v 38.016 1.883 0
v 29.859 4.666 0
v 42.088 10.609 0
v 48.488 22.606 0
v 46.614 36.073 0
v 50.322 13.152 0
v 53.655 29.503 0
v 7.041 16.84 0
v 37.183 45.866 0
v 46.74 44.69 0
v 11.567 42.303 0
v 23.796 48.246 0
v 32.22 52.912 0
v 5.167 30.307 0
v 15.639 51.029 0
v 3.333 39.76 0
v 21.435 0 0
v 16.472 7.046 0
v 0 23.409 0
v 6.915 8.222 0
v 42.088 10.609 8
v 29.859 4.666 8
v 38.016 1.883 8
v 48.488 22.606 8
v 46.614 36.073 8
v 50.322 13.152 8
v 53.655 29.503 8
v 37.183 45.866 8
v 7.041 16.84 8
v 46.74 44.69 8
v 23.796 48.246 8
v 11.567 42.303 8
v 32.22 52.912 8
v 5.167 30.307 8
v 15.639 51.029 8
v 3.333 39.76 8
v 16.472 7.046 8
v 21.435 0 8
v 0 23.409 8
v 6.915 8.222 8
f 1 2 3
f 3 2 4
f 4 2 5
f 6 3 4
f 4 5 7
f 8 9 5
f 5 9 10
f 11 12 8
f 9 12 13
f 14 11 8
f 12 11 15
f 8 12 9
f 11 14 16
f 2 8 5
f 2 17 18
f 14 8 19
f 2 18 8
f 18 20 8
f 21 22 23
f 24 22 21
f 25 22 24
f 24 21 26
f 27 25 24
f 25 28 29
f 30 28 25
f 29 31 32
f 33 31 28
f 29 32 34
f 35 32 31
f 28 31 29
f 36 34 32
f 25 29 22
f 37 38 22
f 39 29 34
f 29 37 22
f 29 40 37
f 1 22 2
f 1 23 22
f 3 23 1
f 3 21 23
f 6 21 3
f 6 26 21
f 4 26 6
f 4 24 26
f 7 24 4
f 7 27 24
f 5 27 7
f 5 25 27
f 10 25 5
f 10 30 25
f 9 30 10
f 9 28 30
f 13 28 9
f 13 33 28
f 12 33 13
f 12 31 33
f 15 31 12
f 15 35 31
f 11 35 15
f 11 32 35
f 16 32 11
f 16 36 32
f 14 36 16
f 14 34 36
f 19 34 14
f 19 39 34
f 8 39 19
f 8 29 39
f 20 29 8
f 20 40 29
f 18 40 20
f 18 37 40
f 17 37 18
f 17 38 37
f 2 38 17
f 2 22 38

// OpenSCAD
$fn = 32;

// ----------------------------------------------------------------------
// Chain sprocket: 10 teeth, 22 mm root radius
// ----------------------------------------------------------------------

// --- parameters (mm) ---
profile_height = 8;       // extrusion height
profile_points = 20;      // points of the closed outline

profile = [[48.488, 22.606], [53.655, 29.503], [46.614, 36.073], [46.74, 44.69], [37.183, 45.866], [32.22, 52.912], [23.796, 48.246], [15.639, 51.029], [11.567, 42.303], [3.333, 39.76], [5.167, 30.307], [0, 23.409], [7.041, 16.84], [6.915, 8.222], [16.472, 7.046], [21.435, 0], [29.859, 4.666], [38.016, 1.883], [42.088, 10.609], [50.322, 13.152]];  // single closed polygon, 20 points, counter clockwise

// --- the one profile operation ---
linear_extrude(height = profile_height) polygon(points = profile);
